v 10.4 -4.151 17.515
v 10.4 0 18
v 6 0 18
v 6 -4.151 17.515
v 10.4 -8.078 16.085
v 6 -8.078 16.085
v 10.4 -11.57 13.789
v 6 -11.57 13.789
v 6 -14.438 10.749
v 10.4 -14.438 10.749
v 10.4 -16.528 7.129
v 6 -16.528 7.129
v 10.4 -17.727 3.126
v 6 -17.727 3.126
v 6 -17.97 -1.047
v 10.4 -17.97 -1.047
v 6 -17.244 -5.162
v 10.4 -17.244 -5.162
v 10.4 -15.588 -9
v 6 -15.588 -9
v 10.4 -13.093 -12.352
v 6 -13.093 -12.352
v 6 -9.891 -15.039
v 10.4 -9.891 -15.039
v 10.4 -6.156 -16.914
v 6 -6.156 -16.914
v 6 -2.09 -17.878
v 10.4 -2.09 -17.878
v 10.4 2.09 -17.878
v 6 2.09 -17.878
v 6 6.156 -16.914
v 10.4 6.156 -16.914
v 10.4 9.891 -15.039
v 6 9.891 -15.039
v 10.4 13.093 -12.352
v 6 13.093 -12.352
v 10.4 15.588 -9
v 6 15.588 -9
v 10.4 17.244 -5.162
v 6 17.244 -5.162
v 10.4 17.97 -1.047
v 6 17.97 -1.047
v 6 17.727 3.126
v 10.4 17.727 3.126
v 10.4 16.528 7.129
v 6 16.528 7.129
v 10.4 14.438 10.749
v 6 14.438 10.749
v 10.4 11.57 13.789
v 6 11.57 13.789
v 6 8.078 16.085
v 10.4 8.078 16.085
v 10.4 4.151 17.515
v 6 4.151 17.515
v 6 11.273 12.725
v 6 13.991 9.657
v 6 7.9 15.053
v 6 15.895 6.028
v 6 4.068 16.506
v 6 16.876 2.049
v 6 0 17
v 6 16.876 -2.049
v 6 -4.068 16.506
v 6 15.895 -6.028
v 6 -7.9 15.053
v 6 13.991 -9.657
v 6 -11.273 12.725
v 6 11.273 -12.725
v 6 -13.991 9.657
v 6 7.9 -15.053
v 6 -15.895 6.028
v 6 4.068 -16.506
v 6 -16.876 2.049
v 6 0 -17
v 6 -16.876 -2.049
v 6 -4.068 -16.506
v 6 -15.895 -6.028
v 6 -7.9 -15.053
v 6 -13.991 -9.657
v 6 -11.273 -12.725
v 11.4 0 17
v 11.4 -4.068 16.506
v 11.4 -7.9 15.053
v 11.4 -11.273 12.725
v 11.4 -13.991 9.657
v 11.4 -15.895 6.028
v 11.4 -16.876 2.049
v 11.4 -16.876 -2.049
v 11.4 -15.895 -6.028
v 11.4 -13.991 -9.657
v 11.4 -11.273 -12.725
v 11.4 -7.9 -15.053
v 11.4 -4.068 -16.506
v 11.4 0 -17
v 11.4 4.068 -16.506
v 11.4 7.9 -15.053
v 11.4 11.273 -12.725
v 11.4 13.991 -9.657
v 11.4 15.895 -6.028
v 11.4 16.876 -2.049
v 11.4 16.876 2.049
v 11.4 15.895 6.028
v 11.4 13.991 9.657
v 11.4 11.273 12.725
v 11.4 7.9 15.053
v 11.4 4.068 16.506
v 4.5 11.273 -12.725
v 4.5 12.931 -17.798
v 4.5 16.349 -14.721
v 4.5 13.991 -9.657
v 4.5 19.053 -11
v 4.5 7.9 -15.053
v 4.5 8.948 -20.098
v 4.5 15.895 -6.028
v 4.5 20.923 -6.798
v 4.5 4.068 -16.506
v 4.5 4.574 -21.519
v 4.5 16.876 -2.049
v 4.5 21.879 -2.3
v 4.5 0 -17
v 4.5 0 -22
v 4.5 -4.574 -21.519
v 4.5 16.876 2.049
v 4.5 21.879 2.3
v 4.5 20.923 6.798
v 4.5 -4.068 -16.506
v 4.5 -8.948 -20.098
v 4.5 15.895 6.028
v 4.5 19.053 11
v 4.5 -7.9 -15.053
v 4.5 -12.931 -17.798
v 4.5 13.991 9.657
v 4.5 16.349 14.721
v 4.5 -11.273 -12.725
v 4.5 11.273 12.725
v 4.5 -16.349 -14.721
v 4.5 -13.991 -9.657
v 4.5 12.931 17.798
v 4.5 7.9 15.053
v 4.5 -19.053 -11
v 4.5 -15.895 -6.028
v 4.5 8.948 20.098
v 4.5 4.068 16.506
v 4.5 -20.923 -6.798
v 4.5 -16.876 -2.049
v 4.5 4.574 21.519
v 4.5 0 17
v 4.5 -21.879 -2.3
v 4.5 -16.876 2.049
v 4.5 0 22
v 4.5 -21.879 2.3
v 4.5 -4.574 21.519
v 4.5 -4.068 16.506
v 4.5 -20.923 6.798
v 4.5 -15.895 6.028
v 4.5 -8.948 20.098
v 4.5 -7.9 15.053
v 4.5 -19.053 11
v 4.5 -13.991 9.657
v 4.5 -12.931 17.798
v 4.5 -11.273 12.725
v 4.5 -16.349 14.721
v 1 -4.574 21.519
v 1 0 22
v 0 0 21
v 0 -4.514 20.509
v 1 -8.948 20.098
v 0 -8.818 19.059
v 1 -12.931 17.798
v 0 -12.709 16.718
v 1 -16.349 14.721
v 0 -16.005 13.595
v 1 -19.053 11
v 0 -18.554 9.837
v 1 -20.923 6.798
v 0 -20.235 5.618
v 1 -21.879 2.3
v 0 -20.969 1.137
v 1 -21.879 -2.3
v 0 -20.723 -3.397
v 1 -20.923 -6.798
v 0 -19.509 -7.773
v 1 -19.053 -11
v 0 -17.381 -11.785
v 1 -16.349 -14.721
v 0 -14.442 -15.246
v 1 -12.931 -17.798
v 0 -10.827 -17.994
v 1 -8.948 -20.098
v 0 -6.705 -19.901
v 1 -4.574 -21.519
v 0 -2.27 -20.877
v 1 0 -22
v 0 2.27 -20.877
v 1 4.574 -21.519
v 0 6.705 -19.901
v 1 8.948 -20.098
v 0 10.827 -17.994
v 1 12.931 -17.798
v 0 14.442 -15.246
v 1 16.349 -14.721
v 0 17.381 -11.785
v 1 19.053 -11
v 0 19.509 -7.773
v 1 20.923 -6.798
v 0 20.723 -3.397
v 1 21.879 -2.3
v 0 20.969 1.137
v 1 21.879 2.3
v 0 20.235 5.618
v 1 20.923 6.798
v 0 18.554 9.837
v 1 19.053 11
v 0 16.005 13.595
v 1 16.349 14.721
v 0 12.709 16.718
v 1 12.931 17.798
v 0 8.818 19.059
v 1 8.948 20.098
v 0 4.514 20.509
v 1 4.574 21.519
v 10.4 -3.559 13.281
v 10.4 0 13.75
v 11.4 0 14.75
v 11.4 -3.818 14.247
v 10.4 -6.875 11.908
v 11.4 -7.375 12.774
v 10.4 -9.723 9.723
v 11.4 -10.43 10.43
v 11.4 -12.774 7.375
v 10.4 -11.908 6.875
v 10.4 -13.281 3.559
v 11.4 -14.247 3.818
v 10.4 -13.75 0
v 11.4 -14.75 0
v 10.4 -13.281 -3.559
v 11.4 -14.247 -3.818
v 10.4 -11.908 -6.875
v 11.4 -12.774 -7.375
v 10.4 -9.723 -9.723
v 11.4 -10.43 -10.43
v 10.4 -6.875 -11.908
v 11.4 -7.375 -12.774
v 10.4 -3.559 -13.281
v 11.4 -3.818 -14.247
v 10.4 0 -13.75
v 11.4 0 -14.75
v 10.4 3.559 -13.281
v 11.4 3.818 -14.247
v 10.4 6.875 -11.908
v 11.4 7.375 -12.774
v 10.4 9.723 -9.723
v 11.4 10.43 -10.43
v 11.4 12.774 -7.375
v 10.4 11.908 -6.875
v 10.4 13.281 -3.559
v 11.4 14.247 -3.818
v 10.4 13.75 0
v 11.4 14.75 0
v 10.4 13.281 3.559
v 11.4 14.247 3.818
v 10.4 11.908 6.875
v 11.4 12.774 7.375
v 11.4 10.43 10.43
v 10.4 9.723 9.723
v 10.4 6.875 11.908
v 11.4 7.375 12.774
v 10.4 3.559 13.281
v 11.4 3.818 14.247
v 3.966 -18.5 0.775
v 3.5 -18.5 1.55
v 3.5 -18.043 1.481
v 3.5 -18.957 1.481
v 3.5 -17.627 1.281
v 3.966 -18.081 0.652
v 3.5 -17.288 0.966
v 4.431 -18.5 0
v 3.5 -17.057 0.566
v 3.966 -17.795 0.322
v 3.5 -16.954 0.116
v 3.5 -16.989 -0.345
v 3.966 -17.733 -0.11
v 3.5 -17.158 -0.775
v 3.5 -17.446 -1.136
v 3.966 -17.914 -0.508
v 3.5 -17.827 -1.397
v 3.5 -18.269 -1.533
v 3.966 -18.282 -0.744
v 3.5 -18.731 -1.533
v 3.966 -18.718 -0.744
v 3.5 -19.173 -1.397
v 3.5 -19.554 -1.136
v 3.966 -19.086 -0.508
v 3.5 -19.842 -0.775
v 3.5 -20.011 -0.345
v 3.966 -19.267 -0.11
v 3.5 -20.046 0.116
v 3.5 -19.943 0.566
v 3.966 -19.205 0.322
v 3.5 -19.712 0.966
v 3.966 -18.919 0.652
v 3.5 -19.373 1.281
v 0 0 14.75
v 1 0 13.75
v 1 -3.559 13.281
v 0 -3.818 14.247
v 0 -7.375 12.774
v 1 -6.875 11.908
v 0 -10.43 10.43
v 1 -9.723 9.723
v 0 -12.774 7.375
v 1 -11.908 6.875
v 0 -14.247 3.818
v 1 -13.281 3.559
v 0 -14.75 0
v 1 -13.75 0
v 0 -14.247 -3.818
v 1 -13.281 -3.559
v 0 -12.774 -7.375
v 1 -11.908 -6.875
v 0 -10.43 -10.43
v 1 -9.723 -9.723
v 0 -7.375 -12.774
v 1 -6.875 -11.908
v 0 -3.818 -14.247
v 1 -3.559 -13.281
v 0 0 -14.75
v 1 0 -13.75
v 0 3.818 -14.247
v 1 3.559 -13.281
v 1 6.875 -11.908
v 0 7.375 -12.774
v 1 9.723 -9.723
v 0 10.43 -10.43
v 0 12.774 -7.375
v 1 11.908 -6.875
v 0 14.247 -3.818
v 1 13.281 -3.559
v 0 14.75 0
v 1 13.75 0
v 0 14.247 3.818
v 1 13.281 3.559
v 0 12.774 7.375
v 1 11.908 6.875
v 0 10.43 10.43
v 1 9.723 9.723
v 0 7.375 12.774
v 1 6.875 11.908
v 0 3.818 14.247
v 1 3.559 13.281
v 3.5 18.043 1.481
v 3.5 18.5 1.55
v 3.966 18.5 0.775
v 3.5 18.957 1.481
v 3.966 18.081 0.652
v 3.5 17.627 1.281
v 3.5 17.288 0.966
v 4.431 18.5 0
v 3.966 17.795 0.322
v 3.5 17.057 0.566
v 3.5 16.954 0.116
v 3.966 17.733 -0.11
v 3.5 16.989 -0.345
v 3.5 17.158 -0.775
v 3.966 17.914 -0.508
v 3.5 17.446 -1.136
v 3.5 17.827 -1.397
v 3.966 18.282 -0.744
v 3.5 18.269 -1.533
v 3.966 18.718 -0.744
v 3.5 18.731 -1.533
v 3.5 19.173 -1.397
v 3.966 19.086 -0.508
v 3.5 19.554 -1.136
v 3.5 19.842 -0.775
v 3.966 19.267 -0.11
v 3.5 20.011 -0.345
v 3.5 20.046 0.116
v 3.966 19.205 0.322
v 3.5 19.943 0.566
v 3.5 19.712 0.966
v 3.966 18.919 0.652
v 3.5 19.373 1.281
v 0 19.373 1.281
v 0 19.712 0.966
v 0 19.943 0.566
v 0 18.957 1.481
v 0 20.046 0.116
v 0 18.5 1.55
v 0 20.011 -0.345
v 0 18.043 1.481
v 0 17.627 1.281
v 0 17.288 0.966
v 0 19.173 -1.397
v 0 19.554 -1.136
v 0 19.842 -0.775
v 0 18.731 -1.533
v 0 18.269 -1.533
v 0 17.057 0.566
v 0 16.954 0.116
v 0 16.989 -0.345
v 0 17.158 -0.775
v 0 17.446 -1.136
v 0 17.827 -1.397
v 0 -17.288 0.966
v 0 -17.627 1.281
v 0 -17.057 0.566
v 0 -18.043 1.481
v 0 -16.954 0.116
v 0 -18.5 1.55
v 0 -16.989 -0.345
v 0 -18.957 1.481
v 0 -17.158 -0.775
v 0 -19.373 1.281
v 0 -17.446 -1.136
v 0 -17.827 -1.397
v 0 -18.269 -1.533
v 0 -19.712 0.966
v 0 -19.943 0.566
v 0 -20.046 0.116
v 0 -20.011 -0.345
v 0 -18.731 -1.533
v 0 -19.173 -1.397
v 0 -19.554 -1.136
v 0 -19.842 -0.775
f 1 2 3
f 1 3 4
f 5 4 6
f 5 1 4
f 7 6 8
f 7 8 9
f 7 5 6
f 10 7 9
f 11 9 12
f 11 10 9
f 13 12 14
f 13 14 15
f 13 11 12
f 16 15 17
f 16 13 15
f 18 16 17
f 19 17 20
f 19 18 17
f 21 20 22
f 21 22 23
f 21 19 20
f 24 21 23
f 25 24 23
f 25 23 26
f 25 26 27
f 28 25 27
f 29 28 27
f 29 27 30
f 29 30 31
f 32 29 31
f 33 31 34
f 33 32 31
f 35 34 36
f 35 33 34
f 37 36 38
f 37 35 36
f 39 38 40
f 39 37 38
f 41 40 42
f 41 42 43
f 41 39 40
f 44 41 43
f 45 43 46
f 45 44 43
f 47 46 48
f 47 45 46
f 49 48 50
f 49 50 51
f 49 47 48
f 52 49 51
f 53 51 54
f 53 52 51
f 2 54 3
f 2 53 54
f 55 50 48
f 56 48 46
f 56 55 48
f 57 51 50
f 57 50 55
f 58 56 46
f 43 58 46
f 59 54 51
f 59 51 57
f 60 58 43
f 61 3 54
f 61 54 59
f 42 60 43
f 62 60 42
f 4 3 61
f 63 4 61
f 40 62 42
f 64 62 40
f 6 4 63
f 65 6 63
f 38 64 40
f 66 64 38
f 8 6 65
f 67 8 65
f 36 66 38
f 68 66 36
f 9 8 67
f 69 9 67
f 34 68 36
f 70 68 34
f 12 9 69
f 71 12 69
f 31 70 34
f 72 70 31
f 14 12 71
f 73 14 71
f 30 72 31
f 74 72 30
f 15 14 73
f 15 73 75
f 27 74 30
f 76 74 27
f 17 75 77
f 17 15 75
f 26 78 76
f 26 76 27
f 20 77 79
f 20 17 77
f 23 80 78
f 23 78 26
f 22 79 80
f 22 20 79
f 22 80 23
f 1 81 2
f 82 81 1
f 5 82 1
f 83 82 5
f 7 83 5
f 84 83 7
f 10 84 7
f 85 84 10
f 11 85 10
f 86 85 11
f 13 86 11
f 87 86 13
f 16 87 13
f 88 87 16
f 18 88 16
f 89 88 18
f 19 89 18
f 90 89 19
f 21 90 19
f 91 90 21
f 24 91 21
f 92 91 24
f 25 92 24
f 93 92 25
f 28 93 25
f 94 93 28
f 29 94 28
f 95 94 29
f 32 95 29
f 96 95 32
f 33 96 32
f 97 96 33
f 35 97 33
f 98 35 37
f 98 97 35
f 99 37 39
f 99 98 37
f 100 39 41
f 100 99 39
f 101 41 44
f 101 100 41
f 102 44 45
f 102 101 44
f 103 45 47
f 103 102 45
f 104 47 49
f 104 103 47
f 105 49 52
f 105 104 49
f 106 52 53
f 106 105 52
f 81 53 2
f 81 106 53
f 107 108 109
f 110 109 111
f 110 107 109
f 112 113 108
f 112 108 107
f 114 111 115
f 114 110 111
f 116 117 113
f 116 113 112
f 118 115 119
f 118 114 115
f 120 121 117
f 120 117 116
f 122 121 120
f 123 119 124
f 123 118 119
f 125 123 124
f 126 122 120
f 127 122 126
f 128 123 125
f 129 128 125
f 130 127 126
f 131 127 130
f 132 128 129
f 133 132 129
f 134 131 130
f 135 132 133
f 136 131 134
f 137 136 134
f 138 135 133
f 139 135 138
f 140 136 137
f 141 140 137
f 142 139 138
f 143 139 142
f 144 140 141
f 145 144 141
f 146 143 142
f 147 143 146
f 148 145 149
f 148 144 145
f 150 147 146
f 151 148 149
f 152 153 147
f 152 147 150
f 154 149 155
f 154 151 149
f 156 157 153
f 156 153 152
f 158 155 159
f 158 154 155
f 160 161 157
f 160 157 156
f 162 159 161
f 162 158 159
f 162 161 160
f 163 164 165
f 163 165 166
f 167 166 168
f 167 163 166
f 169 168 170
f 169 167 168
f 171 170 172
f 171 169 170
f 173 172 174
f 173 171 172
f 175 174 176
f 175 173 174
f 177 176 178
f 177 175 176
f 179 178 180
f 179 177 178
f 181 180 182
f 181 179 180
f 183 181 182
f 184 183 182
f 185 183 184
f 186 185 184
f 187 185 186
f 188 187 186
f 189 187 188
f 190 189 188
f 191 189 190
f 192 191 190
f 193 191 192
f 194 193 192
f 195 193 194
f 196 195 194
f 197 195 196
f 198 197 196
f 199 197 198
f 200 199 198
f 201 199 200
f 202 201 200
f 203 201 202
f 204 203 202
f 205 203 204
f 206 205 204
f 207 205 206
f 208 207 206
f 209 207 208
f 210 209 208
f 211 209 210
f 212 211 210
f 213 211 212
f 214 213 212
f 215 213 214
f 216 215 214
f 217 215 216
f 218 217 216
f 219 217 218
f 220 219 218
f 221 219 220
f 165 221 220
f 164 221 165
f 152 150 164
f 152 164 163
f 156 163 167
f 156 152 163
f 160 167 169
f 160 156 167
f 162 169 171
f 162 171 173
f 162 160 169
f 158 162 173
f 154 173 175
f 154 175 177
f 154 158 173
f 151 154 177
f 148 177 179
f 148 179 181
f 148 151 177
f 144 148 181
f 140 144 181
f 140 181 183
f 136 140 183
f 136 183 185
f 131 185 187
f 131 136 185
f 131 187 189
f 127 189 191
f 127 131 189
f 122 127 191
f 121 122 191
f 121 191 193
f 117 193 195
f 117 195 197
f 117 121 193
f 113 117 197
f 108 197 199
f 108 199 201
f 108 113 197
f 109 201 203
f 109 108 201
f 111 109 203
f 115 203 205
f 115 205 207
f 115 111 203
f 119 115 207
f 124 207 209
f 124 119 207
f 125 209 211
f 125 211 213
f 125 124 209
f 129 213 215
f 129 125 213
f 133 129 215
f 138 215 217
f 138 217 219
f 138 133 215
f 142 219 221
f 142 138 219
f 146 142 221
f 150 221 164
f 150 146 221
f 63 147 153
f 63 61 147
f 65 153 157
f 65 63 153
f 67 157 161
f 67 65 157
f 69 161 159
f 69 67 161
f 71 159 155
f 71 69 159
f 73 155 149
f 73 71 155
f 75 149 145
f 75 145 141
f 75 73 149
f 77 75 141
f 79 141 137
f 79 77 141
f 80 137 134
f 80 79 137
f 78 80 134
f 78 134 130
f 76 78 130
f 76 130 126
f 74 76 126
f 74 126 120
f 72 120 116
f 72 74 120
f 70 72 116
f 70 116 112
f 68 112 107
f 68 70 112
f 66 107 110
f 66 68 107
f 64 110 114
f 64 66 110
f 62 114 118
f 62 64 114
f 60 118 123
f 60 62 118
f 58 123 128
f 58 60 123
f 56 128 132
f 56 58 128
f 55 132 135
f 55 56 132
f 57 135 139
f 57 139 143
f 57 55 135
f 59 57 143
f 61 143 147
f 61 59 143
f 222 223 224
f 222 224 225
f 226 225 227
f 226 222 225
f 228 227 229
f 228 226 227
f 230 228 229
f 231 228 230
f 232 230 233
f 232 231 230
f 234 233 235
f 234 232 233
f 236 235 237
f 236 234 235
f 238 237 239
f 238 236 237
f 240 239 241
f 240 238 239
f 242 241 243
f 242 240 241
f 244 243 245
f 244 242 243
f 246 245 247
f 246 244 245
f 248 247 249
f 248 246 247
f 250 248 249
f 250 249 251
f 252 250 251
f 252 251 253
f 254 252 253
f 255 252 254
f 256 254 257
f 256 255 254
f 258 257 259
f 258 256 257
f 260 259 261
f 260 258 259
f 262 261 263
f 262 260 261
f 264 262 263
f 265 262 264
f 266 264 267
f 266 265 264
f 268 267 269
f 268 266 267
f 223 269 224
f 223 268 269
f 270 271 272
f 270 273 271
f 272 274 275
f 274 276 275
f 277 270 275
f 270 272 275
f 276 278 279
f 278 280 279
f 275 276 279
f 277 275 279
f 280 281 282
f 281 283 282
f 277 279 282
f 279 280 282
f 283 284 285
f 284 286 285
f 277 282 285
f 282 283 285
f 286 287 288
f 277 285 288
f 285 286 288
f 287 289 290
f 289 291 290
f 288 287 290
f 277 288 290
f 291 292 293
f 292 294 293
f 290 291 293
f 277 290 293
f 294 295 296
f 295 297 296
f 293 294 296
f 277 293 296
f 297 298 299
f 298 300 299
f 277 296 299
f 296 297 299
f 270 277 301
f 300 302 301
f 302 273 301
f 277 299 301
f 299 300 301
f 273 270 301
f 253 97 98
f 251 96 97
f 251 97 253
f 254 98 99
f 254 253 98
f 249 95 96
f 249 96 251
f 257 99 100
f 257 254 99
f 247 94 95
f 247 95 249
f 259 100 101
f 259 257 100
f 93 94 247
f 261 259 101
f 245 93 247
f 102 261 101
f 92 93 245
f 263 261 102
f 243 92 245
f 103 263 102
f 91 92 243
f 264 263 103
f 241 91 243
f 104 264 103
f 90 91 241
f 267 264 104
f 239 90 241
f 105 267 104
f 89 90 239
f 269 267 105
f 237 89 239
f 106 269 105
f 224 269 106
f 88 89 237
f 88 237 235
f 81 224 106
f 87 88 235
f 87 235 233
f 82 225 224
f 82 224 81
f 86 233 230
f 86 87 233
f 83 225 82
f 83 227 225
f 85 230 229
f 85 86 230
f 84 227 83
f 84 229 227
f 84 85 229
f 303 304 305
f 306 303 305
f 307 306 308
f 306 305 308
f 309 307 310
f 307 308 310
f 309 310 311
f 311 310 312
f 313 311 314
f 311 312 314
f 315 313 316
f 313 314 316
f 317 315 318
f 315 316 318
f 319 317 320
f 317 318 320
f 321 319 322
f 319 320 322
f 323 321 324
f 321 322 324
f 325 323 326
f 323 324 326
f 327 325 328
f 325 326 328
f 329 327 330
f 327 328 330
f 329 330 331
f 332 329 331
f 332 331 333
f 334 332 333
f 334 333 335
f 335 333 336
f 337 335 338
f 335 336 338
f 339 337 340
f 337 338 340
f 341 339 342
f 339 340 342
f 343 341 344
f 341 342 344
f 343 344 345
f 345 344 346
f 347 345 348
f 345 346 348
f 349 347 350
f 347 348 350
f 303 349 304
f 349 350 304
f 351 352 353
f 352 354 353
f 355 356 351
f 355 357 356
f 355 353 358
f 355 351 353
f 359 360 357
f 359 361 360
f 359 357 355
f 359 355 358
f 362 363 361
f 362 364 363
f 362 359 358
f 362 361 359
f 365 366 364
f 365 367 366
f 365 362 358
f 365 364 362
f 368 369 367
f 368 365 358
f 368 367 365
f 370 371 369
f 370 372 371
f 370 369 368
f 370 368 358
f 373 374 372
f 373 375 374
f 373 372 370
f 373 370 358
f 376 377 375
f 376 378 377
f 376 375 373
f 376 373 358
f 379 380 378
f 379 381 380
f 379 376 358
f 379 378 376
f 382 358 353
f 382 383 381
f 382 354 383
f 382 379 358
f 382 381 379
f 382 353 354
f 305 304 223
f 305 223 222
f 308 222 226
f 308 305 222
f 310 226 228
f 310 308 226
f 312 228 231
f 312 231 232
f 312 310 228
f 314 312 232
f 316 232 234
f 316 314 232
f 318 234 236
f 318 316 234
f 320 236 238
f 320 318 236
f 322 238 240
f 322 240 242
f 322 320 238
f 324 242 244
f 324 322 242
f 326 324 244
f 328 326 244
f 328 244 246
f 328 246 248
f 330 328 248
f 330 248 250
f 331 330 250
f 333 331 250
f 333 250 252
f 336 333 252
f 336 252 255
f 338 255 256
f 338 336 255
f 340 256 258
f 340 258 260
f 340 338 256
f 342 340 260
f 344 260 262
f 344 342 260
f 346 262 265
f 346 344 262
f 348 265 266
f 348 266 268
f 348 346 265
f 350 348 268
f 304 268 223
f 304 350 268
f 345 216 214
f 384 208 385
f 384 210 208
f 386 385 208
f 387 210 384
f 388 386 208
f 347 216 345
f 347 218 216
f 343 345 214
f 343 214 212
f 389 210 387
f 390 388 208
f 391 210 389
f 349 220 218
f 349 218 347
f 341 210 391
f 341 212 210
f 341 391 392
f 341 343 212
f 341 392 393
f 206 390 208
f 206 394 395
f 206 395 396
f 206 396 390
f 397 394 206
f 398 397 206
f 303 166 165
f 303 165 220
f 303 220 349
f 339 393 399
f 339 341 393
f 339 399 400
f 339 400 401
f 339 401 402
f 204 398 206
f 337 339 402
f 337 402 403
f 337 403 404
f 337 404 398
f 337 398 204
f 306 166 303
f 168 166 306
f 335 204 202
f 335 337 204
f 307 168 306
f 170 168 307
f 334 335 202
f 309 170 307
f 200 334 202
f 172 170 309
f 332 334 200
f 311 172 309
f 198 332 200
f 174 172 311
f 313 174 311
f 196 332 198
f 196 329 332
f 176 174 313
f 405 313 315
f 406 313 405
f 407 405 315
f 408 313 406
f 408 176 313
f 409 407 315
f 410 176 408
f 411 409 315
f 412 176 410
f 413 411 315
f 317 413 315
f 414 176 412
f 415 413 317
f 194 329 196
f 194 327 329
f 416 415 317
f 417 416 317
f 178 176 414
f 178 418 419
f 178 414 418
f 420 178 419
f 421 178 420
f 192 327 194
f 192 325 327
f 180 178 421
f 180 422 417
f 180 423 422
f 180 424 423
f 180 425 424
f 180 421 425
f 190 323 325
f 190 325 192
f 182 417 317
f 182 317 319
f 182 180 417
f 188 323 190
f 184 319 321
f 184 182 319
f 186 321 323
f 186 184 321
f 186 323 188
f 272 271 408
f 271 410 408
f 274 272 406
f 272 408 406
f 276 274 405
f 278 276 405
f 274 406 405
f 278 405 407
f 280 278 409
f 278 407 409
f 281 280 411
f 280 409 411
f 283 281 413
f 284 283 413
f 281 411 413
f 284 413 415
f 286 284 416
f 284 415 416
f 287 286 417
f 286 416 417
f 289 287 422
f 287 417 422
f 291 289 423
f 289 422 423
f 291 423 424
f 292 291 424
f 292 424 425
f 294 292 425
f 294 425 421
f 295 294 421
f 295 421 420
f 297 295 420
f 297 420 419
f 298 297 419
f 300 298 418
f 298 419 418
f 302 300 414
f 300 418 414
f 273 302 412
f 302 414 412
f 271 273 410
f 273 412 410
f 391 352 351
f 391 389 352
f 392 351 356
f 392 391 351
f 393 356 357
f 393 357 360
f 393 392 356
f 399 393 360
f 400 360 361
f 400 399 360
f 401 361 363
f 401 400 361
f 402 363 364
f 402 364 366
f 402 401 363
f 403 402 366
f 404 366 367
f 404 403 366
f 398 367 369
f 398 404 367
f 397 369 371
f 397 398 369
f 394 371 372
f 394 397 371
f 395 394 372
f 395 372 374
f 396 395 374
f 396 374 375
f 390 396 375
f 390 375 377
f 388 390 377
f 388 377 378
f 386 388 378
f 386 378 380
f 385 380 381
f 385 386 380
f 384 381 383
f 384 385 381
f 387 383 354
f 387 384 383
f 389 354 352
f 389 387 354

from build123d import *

# Parameters (mm, degrees)
CHANFREIN1_SIZE = 1


with BuildPart() as part:
    # Esquisse1 → Révolution1 (revolve)
    with BuildSketch(Plane.XY, mode=Mode.PRIVATE) as r_volution1_sk:
        Polygon((0, 13.75), (0, 22), (4.5, 22), (4.5, 17), (6, 17), (6, 18), (11.4, 18), (11.4, 13.75), align=None)
    revolve(r_volution1_sk.sketch.rotate(Axis((0, 0, 0), (1, 0, 0)), 90), axis=Axis((0, 0, 0), (1, 0, 0)))

    # Chanfrein1
    chanfrein1_edges = [part.edges().sort_by_distance(p)[0] for p in [
        (11.4, 0, -13.75),
        (11.4, 0, -18),
        (0, 0, -22),
        (0, 0, -13.75),
    ]]
    chamfer(chanfrein1_edges, length=CHANFREIN1_SIZE)

    # Esquisse3 → Diamètre du perçage Ø3.1 (3.1)1 (revolve, cut)
    with BuildSketch(Plane.ZX.offset(18.5)):
        Polygon((0, 0), (0, 4.431333959), (1.55, 3.5), (1.55, 0), align=None)
    diam_tre_du_per_age_3_1_3_1_1 = revolve(axis=Axis((-6.35, 18.5, 0), (1, 0, 0)), mode=Mode.SUBTRACT)

    # Symétrie1: Diamètre du perçage Ø3.1 (3.1)1 across plane
    add(diam_tre_du_per_age_3_1_3_1_1.mirror(Plane.ZX), mode=Mode.SUBTRACT)


solid = part.part
